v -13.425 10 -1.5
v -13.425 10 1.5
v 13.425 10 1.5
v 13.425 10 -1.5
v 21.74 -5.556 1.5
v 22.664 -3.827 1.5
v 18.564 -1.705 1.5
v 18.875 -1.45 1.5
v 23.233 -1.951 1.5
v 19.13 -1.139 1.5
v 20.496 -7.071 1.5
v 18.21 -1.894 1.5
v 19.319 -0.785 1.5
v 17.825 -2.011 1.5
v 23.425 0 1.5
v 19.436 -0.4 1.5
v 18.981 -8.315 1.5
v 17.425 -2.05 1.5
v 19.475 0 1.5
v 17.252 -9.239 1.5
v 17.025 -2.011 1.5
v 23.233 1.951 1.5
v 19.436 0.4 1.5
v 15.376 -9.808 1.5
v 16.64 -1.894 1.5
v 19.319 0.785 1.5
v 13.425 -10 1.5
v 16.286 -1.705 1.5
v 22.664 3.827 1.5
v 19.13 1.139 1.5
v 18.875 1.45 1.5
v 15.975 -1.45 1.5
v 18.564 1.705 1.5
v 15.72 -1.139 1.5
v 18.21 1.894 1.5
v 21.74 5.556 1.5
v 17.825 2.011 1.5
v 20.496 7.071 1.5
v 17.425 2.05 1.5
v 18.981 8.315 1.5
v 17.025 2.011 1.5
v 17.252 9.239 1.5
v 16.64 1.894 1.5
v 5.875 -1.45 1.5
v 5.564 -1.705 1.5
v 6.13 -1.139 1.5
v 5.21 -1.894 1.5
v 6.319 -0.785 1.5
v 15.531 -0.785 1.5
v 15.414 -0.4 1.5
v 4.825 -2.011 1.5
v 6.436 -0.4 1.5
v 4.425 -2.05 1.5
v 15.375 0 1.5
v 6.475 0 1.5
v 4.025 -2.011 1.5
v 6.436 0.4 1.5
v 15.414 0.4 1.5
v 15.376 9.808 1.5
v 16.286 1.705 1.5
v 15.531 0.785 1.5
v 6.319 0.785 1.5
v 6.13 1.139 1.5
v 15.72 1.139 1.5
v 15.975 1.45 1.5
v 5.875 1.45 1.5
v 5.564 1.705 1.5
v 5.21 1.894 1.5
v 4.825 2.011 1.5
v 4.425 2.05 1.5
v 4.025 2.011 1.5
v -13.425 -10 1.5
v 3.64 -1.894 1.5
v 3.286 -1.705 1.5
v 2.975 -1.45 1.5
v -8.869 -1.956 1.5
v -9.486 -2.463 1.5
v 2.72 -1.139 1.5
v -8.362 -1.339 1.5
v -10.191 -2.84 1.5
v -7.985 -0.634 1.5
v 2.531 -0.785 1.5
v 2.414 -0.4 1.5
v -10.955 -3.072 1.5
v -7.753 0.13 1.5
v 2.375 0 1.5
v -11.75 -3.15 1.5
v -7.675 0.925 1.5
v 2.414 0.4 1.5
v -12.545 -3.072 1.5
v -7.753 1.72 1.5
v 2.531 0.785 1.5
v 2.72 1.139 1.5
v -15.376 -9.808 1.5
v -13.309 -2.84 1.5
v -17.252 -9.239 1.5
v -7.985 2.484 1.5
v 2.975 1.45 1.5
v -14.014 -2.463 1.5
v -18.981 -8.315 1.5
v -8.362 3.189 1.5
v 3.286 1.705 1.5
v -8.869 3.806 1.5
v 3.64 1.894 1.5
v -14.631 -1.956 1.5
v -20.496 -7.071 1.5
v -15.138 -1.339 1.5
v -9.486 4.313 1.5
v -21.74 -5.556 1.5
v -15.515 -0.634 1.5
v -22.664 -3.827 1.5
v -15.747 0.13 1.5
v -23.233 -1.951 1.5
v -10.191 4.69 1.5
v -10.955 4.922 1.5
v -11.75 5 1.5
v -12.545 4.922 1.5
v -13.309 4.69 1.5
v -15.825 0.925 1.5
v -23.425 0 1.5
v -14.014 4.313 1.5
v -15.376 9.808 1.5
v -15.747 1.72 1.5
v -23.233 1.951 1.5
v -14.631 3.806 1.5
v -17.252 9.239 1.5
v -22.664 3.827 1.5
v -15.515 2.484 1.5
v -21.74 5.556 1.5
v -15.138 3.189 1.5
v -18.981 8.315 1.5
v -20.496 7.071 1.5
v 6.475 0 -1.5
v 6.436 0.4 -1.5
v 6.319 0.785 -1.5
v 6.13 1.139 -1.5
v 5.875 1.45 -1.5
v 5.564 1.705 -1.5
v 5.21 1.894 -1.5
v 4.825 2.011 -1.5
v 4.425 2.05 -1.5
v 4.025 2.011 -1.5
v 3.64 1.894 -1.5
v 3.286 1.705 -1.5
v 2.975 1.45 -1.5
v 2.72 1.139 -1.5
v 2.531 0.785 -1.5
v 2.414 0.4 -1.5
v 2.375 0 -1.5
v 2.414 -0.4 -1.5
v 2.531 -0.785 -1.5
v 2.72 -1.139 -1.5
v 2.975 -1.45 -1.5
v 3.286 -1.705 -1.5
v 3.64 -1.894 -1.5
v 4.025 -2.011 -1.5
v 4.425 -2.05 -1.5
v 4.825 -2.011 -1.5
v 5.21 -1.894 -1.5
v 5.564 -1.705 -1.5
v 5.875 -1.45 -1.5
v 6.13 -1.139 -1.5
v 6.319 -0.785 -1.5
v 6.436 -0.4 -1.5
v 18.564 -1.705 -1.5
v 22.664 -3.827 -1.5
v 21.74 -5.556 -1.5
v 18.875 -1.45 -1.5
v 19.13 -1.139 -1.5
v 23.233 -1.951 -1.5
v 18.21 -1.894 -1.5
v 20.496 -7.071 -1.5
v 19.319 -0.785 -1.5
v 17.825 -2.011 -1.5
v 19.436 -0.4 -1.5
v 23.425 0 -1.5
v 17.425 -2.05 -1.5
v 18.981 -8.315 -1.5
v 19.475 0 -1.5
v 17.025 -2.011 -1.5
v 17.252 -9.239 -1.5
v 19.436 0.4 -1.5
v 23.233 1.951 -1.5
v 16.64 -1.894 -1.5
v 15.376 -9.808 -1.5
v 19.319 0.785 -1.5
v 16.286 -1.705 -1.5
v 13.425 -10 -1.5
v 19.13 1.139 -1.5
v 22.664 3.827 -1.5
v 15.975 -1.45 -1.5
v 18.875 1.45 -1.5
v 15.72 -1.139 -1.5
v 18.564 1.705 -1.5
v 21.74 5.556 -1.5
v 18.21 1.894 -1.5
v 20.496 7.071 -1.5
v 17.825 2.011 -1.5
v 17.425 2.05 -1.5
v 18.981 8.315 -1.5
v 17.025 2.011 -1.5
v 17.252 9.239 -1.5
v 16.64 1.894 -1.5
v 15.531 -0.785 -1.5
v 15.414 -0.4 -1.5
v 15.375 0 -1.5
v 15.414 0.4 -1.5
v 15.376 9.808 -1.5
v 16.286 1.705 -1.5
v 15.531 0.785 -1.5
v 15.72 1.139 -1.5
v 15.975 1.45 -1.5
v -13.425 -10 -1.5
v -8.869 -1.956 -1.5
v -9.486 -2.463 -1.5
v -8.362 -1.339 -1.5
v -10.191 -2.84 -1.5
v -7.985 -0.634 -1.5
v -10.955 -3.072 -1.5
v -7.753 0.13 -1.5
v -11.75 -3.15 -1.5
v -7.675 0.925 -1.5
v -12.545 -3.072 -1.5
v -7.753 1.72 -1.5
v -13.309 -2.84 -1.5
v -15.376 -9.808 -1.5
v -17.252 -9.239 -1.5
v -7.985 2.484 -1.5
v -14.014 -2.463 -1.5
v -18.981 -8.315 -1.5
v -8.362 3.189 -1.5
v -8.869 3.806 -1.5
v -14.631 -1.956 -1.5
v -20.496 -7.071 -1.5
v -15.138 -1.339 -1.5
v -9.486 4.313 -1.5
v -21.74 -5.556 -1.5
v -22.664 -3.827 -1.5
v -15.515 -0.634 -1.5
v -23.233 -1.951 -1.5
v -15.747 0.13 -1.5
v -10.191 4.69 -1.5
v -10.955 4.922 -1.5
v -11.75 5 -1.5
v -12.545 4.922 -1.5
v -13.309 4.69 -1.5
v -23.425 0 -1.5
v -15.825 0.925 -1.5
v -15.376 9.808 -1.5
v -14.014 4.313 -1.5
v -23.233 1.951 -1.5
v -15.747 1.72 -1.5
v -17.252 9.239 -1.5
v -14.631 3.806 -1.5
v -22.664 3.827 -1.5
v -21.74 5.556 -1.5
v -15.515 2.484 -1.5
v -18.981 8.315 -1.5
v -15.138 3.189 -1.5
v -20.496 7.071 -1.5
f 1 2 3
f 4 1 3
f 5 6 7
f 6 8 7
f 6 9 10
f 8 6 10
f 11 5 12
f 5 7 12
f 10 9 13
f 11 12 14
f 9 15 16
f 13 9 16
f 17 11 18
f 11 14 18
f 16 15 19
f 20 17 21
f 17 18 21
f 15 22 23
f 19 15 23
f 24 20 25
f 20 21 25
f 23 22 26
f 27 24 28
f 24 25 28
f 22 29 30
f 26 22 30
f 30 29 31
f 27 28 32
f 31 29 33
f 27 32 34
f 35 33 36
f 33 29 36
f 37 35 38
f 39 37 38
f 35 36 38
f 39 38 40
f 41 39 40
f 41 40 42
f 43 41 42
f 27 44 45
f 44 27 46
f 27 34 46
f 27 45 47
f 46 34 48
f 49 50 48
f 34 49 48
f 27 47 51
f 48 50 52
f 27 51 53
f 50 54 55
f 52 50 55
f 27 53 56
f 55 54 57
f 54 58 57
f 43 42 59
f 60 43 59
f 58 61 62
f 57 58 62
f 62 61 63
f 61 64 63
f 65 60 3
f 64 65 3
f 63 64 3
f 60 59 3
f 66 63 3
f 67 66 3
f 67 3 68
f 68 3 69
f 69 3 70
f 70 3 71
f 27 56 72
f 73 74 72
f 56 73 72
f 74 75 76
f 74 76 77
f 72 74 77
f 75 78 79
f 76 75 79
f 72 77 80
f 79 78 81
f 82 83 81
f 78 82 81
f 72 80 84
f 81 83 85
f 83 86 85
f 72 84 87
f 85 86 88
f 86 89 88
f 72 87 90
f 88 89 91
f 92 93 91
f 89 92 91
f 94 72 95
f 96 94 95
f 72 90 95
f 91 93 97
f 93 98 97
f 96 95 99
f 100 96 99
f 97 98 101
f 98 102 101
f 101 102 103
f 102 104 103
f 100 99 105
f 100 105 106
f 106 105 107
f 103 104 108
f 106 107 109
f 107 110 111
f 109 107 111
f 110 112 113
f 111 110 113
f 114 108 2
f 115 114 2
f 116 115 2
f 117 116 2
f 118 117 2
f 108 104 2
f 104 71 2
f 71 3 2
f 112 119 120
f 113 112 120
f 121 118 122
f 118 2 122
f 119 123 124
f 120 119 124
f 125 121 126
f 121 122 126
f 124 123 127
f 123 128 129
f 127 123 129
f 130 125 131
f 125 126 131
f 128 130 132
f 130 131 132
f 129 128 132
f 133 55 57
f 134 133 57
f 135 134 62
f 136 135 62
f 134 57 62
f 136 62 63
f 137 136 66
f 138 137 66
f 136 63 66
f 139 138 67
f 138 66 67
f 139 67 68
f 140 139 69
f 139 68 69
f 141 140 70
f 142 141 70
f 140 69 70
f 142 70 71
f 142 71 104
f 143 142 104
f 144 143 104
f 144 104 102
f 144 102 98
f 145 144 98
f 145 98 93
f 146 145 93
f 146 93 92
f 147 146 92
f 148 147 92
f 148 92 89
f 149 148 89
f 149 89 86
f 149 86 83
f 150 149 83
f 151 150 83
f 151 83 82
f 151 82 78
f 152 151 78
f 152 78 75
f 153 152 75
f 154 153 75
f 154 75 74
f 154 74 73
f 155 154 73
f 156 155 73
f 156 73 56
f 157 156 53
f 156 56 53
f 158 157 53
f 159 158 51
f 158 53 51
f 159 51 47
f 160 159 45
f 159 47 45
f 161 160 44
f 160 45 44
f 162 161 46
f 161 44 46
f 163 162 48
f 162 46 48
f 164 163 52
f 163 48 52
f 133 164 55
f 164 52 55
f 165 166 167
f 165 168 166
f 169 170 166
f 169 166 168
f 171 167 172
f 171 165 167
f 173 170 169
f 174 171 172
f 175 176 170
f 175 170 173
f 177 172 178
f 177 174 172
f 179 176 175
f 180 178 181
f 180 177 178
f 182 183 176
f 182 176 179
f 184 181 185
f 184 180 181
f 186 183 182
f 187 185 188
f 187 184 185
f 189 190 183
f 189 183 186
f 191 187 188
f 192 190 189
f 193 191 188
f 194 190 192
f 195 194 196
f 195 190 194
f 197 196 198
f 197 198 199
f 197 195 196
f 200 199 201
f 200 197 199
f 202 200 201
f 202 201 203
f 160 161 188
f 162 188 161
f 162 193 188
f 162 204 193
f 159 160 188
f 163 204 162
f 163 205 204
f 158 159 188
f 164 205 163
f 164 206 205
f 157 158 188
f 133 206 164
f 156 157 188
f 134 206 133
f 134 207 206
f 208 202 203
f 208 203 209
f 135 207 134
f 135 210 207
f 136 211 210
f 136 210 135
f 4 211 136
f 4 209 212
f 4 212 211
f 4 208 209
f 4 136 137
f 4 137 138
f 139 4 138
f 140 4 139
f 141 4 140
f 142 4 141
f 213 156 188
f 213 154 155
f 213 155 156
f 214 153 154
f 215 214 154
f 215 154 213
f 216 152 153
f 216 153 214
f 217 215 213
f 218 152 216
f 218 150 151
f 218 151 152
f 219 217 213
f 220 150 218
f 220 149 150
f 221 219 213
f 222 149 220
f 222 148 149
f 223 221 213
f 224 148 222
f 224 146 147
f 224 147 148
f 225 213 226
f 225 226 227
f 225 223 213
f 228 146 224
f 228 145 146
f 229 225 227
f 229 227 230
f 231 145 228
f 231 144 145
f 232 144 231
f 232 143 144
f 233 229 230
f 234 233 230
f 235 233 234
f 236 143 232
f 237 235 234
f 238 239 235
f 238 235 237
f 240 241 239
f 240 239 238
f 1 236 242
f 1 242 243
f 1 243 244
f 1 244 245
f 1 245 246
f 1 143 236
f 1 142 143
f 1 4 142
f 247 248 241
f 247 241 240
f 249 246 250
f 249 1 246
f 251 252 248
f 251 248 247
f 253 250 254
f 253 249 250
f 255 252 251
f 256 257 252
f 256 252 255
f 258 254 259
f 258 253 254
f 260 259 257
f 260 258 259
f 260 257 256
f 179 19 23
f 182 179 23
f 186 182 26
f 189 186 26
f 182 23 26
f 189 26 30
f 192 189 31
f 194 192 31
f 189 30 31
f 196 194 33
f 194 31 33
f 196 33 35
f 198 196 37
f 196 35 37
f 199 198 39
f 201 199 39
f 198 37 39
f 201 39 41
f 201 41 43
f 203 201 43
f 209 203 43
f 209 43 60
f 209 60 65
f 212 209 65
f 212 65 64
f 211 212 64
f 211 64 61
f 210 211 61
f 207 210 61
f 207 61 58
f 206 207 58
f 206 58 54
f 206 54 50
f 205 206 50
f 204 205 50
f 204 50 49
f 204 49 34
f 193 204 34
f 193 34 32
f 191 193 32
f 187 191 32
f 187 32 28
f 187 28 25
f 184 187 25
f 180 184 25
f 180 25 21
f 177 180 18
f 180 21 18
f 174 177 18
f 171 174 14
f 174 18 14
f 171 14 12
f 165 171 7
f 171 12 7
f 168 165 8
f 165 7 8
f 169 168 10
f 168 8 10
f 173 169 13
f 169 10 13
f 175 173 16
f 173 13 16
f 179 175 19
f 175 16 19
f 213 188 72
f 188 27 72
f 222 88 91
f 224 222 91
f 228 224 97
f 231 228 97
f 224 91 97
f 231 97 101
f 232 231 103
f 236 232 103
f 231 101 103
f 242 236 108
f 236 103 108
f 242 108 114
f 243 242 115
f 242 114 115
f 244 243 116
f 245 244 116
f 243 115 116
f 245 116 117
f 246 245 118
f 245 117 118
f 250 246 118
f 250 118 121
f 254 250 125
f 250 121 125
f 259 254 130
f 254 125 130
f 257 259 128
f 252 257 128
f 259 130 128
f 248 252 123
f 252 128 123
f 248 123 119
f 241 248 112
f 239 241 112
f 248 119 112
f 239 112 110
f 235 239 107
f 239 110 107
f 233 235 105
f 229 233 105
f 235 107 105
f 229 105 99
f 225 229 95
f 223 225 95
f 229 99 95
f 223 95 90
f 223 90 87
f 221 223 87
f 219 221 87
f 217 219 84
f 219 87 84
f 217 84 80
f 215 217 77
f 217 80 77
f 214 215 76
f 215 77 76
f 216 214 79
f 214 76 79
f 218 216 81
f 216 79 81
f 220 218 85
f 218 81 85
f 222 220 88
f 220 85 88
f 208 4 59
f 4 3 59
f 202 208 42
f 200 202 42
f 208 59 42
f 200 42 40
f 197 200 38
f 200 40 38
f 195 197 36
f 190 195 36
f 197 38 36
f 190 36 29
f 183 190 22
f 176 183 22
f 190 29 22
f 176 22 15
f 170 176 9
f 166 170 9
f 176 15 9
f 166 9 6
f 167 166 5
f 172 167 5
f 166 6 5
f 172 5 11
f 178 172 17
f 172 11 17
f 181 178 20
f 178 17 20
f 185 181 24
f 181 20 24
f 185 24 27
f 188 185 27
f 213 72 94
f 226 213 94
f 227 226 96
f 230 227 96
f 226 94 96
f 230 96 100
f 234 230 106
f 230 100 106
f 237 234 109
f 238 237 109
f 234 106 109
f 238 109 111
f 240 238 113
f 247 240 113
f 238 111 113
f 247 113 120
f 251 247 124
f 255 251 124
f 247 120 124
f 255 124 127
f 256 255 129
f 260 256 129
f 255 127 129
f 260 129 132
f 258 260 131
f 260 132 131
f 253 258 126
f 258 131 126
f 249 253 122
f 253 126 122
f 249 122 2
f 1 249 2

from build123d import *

# Parameters (mm, degrees)
BOSS_EXTRUDE1_DEPTH = 1.5
SKETCH3_R           = 2.05
CUT_EXTRUDE1_DEPTH  = 26.646259474
SKETCH4_R           = 4.075
CUT_EXTRUDE2_DEPTH  = 3


with BuildPart() as part:
    # Sketch2 → Boss-Extrude1 (new, symmetric)
    with BuildSketch(Plane.XY):
        with BuildLine():
            Line((-13.425, 10), (13.425, 10))
            ThreePointArc((13.425, 10), (23.425, 0), (13.425, -10))
            Line((13.425, -10), (-13.425, -10))
            ThreePointArc((-13.425, -10), (-23.425, 0), (-13.425, 10))
        make_face()
    extrude(amount=BOSS_EXTRUDE1_DEPTH, both=True)

    # Sketch3 → Cut-Extrude1 (cut, through all)
    with BuildSketch(Plane.XY.offset(1.5)):
        with Locations((4.425, 0)):
            Circle(SKETCH3_R)
        with Locations((17.425, 0)):
            Circle(SKETCH3_R)
    extrude(amount=-CUT_EXTRUDE1_DEPTH, mode=Mode.SUBTRACT)

    # Sketch4 → Cut-Extrude2 (cut)
    with BuildSketch(Plane.XY.offset(1.5)):
        with Locations((-11.75, 0.925)):
            Circle(SKETCH4_R)
    extrude(amount=-CUT_EXTRUDE2_DEPTH, mode=Mode.SUBTRACT)


solid = part.part
